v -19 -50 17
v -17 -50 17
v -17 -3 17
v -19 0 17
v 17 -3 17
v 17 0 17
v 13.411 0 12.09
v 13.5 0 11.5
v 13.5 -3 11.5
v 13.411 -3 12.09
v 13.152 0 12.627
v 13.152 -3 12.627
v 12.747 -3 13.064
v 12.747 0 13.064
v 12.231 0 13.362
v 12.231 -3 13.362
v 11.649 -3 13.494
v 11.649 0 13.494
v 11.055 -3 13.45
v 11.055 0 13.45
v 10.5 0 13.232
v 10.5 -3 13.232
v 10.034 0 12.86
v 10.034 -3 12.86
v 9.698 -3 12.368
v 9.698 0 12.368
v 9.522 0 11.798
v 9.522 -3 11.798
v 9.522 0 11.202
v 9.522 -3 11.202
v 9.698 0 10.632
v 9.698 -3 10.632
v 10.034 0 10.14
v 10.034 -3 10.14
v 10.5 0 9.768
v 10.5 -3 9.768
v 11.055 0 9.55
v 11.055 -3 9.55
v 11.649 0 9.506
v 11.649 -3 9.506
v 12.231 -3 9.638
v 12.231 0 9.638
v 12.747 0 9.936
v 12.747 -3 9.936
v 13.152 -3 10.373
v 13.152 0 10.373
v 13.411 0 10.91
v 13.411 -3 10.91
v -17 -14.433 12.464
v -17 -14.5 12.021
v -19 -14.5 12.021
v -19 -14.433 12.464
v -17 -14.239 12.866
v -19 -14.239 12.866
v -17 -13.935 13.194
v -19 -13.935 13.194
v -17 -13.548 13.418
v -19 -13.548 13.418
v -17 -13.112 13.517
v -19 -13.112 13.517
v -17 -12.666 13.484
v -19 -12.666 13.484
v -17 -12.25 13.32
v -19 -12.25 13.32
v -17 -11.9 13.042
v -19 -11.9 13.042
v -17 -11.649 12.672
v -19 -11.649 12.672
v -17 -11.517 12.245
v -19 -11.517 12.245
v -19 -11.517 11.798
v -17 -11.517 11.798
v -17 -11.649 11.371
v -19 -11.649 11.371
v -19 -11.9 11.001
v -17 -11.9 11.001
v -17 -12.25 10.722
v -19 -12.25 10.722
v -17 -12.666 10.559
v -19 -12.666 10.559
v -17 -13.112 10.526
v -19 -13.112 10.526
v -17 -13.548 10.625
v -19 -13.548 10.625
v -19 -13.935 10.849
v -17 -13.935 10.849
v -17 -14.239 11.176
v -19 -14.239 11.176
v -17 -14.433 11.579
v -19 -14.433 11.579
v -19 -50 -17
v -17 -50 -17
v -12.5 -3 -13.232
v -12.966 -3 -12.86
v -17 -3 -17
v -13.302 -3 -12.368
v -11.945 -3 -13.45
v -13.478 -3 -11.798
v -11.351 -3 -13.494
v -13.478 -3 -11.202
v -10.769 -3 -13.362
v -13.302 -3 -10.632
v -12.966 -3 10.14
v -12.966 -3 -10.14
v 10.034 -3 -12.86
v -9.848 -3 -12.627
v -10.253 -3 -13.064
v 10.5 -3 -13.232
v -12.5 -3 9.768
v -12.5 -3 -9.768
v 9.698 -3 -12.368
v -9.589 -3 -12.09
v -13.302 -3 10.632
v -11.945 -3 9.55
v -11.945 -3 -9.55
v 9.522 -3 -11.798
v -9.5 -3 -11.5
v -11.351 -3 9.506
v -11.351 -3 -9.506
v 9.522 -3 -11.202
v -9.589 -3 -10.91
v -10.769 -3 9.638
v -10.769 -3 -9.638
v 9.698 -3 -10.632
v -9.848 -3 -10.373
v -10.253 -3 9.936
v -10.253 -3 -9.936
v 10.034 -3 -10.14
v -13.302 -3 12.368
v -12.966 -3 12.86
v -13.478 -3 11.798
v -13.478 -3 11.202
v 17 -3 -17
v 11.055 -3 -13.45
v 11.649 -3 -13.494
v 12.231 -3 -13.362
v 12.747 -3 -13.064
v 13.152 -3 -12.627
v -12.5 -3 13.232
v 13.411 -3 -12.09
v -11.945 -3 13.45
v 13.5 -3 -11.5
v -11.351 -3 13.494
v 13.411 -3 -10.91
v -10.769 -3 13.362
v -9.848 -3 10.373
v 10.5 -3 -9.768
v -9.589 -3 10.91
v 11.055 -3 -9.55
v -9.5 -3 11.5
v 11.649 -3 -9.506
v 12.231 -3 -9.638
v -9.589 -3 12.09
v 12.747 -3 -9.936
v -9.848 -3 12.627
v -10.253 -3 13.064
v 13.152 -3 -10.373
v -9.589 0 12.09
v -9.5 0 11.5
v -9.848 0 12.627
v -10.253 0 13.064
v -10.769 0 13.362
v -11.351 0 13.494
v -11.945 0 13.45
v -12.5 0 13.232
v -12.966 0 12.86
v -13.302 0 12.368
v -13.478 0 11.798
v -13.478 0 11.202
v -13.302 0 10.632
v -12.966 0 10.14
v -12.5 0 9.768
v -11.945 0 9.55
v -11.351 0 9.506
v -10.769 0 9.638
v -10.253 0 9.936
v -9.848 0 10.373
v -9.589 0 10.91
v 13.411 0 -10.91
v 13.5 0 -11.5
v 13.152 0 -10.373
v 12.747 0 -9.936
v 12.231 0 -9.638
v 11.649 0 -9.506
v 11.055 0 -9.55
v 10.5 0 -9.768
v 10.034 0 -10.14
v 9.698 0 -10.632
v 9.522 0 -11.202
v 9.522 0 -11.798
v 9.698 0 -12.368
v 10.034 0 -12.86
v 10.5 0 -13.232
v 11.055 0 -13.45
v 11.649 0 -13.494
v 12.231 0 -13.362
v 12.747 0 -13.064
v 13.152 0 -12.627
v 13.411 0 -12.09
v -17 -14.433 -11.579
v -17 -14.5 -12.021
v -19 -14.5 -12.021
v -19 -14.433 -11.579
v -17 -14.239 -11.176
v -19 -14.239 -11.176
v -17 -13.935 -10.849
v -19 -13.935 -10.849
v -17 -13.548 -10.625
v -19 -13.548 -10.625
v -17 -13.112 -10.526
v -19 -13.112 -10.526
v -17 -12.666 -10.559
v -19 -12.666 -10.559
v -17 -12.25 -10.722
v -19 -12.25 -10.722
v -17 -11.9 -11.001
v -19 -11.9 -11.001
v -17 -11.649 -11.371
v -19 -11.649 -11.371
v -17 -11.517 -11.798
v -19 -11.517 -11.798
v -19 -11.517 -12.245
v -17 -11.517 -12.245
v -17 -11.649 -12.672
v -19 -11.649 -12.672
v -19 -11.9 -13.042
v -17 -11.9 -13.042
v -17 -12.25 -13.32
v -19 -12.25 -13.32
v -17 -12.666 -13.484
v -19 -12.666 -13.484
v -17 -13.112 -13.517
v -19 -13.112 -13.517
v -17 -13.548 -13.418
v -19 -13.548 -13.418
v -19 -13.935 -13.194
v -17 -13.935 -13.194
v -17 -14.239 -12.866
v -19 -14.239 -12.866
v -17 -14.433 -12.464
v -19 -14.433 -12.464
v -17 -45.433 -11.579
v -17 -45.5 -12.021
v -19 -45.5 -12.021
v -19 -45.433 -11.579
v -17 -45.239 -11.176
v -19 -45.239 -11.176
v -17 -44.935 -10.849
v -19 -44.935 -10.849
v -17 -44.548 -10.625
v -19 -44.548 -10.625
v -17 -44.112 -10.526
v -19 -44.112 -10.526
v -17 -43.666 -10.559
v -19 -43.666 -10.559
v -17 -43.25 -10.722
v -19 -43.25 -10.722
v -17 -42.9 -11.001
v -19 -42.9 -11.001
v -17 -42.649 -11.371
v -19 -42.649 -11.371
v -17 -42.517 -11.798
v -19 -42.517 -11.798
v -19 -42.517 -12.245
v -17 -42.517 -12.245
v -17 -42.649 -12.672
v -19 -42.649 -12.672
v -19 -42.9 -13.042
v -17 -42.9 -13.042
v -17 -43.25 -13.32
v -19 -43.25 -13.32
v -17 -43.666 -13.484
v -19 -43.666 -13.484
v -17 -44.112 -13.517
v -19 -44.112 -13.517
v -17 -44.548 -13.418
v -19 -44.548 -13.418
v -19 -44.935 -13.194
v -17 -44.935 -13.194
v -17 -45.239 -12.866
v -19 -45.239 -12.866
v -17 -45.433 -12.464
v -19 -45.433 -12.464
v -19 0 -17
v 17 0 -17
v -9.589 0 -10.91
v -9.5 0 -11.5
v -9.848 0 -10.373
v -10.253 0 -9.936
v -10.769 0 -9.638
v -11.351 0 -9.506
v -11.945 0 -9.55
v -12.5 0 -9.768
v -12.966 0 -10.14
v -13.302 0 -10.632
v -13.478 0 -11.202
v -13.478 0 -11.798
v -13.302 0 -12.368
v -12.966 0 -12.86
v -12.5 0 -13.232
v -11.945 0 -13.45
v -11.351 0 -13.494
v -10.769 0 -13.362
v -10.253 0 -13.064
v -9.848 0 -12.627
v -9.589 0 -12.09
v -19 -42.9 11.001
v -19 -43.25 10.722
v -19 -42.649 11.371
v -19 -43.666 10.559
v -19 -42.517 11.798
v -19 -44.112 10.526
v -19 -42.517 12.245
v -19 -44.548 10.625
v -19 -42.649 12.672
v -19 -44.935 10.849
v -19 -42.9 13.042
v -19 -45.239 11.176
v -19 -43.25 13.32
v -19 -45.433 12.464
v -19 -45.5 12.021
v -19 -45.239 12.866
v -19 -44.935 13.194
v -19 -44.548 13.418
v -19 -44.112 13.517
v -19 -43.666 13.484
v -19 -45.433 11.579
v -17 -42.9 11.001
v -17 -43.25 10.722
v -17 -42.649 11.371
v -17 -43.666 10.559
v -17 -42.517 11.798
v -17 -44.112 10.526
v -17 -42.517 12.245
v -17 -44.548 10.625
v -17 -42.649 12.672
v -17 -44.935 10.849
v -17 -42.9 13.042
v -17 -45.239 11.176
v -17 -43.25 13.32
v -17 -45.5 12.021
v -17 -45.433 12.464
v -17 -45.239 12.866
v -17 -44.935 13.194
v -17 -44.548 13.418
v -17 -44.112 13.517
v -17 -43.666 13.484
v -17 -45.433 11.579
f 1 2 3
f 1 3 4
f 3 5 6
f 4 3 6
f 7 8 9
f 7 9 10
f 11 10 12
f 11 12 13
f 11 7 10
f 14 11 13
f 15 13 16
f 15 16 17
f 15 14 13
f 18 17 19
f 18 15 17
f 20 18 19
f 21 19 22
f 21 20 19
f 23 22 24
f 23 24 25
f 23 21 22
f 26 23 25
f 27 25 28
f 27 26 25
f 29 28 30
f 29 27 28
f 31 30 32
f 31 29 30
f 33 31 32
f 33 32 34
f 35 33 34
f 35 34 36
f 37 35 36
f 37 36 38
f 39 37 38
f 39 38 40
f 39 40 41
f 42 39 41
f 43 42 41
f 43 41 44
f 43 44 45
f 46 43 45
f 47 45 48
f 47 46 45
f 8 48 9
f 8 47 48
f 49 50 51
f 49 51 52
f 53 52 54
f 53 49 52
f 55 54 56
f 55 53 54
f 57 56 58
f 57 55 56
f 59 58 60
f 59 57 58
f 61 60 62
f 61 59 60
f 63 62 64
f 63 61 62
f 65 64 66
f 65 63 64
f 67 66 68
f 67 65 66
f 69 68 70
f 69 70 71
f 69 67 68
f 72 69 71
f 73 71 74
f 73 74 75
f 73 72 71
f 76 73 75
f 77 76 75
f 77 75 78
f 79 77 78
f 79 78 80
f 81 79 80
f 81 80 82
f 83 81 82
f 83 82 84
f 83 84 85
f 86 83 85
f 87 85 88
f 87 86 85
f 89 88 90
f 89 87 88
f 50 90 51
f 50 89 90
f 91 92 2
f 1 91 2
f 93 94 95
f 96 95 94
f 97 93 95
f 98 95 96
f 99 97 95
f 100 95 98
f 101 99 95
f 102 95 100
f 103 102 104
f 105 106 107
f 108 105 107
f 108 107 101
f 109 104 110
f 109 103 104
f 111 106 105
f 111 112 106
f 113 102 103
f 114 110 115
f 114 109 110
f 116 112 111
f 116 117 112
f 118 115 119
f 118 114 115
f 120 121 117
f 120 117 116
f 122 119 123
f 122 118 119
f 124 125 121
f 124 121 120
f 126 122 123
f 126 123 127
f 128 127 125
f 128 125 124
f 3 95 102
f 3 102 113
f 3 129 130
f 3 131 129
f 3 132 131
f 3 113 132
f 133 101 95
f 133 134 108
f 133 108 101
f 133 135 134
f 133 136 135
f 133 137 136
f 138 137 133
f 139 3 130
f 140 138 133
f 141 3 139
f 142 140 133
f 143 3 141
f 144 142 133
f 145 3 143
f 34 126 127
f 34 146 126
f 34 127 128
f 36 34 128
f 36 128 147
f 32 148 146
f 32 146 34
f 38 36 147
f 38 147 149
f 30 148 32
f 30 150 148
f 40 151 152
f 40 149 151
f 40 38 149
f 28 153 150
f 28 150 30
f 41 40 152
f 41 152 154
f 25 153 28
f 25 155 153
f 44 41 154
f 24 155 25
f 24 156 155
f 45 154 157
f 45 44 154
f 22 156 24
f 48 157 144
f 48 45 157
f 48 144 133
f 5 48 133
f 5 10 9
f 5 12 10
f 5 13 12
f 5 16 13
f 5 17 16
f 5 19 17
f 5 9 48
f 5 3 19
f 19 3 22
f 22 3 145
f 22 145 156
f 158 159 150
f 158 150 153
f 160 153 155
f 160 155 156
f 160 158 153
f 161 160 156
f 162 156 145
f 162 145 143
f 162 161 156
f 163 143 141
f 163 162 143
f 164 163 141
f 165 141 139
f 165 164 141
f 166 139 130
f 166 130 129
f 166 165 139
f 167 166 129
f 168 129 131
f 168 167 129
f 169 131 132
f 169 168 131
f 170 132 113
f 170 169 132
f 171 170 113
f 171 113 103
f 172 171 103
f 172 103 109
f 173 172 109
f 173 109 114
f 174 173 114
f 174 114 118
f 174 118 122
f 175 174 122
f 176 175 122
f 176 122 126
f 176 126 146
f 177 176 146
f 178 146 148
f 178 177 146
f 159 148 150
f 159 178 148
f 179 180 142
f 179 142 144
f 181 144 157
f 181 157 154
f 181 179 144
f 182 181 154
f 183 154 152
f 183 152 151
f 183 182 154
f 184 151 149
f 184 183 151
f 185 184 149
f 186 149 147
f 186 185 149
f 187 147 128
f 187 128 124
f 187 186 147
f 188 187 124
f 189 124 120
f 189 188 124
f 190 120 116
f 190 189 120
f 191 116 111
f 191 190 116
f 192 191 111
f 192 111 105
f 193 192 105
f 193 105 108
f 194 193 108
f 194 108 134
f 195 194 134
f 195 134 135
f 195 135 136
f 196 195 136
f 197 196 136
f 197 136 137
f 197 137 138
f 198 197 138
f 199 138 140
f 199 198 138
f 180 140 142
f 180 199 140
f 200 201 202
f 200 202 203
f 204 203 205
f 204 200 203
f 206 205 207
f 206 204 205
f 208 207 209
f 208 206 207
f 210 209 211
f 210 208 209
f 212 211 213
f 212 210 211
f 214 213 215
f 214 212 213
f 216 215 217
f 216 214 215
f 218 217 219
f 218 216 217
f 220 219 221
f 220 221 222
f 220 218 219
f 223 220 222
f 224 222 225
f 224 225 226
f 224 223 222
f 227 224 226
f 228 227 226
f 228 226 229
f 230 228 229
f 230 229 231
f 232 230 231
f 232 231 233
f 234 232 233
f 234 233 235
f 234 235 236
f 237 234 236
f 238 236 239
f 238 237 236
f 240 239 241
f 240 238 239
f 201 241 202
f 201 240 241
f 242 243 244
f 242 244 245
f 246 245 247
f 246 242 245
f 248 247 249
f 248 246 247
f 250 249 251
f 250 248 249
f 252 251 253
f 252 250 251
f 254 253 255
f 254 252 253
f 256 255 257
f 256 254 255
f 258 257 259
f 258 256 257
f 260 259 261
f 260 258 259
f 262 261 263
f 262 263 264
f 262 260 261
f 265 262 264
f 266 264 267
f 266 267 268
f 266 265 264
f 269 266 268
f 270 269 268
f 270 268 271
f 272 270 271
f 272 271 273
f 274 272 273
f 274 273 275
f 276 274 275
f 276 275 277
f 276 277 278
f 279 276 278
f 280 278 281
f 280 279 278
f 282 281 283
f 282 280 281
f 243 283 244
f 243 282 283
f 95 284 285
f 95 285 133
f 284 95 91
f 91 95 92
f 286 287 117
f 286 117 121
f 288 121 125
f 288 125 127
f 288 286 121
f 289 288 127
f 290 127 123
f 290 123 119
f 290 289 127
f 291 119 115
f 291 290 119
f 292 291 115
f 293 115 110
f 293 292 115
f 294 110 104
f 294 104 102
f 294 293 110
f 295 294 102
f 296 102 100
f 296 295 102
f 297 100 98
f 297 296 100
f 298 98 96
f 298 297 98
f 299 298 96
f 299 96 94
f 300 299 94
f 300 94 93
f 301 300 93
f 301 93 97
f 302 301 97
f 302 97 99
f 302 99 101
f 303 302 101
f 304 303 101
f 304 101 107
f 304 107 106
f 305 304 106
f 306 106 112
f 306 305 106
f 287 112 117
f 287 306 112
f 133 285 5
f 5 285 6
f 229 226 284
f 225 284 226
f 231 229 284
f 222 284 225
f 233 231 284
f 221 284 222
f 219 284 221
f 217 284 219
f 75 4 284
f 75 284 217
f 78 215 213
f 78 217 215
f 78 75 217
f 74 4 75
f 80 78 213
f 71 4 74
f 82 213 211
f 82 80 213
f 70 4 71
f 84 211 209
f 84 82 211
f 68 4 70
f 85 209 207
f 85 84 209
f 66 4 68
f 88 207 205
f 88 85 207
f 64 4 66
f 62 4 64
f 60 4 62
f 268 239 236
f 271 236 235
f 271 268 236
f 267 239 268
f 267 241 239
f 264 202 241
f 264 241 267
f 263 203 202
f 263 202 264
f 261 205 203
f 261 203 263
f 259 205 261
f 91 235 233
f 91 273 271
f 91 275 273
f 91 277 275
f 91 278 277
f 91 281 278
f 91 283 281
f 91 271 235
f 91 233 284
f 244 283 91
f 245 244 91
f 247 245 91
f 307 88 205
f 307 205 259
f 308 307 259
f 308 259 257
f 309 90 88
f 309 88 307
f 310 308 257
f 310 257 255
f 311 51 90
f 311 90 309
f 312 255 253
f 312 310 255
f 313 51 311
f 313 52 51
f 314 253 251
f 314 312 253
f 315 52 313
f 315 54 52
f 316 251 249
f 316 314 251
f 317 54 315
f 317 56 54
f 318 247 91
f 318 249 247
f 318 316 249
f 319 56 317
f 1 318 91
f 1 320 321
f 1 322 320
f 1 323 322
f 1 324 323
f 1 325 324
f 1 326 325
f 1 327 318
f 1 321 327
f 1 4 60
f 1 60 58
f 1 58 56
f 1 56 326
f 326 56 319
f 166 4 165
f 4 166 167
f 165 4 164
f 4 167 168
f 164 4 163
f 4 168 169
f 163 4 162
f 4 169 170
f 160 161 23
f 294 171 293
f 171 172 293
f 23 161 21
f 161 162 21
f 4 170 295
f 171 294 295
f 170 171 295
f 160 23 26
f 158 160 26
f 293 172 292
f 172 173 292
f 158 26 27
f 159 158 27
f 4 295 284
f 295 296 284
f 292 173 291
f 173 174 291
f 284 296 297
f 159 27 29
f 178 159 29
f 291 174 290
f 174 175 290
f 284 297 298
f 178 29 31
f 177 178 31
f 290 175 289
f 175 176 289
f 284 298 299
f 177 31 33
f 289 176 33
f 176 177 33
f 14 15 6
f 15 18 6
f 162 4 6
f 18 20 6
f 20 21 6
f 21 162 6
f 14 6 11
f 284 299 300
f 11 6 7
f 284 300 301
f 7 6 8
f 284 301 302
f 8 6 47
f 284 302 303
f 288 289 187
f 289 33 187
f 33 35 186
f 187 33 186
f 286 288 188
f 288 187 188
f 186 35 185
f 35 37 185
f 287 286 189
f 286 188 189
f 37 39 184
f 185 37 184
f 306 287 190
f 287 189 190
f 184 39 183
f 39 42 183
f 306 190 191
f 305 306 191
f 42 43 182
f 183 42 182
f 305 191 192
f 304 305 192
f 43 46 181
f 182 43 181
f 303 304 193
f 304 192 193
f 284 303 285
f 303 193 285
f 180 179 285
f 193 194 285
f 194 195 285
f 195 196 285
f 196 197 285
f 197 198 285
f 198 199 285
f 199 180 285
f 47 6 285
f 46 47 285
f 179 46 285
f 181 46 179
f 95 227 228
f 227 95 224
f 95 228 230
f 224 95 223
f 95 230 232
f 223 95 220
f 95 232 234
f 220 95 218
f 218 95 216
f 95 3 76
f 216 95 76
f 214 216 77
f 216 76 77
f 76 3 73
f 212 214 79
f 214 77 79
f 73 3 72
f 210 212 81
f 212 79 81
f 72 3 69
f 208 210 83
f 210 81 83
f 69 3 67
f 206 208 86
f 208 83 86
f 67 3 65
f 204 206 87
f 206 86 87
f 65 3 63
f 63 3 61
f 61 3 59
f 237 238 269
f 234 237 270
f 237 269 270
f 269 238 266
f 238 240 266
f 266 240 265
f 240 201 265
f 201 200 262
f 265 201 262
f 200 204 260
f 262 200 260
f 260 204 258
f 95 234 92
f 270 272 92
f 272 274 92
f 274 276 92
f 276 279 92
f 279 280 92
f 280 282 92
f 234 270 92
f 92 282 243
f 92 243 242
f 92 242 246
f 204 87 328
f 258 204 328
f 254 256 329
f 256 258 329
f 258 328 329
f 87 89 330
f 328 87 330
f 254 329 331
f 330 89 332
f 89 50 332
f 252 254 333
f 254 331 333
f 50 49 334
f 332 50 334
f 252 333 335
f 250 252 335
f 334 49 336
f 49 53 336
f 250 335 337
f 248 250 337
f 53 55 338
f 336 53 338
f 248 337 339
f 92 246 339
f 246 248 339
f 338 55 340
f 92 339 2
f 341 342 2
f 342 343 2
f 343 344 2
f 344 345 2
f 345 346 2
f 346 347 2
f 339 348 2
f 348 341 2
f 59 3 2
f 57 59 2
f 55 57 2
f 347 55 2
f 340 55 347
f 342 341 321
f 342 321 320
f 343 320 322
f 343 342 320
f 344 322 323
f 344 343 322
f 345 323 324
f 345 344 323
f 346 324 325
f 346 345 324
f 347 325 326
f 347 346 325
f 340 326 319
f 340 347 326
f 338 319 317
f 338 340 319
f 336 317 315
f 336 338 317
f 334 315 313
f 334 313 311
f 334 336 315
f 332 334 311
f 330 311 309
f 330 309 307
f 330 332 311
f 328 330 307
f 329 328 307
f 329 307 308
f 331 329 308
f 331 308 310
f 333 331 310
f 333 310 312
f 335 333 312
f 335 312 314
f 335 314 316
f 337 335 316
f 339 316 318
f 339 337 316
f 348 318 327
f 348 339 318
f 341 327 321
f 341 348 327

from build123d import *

# Parameters (mm, degrees)
F0_W     = 34
F0_H     = 34
F0_R     = 2
F1_DEPTH = 3
F2_R     = 1.5
F3_DEPTH = 2


with BuildPart() as f1:
    # F0 (on Front) → F1 (new body)
    with BuildSketch(Plane.XZ):
        Rectangle(F0_W, F0_H)
        with Locations((-11.5, -11.5)):
            Circle(F0_R, mode=Mode.SUBTRACT)
        with Locations((11.5, -11.5)):
            Circle(F0_R, mode=Mode.SUBTRACT)
        with Locations((-11.5, 11.5)):
            Circle(F0_R, mode=Mode.SUBTRACT)
        with Locations((11.5, 11.5)):
            Circle(F0_R, mode=Mode.SUBTRACT)
    extrude(amount=F1_DEPTH)

    # F2 (on face) → F3 (join)
    with BuildSketch(Plane(origin=(-17, 0, 0), x_dir=(0, -1, 0), z_dir=(-1, 0, 0))):
        Polygon((28.5, 17), (0, 17), (0, -17), (28.5, -17), (28.5, 0), align=None)
        with Locations((13, -12.021406)):
            Circle(F2_R, mode=Mode.SUBTRACT)
        with Locations((13, 12.021406)):
            Circle(F2_R, mode=Mode.SUBTRACT)
        Polygon((50, 17), (28.5, 17), (28.5, 0), (28.5, -17), (50, -17), align=None)
        with Locations((44, -12.021406)):
            Circle(F2_R, mode=Mode.SUBTRACT)
        with Locations((44, 12.021406)):
            Circle(F2_R, mode=Mode.SUBTRACT)
    extrude(amount=F3_DEPTH)


solid = f1.part
